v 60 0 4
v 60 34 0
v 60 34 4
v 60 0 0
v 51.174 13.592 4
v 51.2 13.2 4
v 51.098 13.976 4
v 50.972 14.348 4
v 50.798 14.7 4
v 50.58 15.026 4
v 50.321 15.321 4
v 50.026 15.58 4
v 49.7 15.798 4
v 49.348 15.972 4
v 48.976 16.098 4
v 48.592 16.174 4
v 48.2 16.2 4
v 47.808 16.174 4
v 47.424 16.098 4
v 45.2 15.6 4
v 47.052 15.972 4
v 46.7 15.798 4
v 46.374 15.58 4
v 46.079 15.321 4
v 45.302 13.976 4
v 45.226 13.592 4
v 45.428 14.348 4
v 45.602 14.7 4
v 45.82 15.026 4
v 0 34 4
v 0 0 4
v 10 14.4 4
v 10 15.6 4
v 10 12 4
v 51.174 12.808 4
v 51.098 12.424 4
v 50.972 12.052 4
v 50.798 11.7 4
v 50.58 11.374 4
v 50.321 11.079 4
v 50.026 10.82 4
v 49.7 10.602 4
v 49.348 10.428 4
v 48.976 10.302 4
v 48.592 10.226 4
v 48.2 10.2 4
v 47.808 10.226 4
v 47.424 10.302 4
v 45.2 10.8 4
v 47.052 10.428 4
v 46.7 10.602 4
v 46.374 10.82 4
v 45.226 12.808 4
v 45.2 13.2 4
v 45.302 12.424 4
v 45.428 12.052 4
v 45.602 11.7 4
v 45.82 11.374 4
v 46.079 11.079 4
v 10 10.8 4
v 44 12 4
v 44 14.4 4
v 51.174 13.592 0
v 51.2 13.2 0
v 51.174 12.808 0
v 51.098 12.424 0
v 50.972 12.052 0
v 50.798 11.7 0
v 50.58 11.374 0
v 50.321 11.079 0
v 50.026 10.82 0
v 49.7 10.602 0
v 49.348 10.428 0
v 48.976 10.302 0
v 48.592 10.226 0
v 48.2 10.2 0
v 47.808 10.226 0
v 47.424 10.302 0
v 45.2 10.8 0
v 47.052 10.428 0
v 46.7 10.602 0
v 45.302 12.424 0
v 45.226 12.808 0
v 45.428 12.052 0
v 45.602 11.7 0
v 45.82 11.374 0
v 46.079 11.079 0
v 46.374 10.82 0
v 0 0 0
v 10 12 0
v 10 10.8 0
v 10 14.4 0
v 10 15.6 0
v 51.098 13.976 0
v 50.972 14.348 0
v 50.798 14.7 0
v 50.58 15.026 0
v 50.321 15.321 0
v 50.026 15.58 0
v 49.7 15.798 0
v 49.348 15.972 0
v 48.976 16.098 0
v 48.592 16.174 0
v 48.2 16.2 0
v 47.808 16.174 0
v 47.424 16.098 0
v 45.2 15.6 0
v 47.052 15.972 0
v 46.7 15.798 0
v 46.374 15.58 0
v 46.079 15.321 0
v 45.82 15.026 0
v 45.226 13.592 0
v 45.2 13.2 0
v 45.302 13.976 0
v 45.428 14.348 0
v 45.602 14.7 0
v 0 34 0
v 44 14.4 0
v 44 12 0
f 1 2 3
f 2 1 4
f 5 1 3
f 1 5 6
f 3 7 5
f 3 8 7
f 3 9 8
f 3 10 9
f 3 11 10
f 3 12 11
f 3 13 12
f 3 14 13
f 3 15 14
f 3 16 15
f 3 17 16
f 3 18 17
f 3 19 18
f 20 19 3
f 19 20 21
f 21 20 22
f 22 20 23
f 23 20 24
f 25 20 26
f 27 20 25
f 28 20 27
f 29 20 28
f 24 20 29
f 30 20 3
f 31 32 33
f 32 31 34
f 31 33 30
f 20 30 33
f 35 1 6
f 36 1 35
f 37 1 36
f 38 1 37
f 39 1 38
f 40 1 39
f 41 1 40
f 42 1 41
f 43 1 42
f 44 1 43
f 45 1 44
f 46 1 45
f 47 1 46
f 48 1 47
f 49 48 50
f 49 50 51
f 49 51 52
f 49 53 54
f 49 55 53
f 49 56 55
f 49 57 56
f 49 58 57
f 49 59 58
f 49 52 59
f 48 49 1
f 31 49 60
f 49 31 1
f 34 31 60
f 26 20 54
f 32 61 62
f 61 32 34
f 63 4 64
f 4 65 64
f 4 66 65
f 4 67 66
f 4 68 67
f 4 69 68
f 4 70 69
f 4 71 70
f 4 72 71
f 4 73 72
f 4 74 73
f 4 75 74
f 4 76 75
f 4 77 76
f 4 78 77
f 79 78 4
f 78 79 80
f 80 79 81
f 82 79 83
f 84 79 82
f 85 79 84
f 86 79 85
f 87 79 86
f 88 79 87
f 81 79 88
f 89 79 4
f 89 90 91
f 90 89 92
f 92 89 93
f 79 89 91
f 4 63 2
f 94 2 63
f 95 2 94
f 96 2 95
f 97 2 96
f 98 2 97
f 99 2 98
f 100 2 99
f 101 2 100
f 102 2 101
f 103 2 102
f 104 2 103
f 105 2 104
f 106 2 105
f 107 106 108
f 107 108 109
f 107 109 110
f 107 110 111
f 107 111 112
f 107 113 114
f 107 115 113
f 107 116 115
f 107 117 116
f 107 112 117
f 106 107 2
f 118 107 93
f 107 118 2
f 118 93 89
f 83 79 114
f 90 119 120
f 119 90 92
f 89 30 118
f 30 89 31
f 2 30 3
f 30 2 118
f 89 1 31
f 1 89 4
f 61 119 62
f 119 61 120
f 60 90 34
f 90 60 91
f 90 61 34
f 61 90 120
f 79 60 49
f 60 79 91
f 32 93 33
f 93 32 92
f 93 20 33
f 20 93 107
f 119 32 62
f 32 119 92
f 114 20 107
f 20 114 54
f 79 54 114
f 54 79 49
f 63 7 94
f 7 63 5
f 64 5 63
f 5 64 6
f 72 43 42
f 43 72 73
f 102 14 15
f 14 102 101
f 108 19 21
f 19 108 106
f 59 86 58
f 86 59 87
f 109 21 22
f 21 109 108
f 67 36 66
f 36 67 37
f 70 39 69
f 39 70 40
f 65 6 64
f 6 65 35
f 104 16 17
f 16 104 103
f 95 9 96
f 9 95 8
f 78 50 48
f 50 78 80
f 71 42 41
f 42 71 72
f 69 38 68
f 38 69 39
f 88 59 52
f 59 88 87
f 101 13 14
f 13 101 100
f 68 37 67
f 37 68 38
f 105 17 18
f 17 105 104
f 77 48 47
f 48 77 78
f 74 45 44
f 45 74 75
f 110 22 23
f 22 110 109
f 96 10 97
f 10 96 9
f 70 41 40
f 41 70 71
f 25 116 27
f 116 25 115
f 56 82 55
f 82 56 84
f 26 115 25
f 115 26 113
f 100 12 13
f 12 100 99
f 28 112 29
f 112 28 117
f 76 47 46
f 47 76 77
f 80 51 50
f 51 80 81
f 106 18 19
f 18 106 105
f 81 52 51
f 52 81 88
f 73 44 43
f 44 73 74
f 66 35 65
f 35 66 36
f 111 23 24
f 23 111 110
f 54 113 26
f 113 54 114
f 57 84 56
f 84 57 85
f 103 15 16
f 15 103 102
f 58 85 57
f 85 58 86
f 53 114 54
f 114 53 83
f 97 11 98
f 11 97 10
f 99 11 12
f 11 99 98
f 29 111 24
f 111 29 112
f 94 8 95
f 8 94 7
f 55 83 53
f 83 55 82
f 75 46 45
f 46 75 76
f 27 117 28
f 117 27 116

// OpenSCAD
// A flat bracket with a springy arm cut out of it, that bends in the plane of the plate to let a
// 6 mm rod in. defect=true leaves a thin skin under the slots: the arm is joined to the plate along
// its whole length and cannot bend.
defect = false;
plate = [60, 34, 4];
arm_w = 2.4;
arm_l = 34;
slot = 1.2;
rod = 6;
skin = defect ? 0.6 : -1;

echo(cadverify_spec = [
    ["bounds", [[0, 0, 0], plate]],
    ["bodies", 1],
    ["through_holes", defect ? 0 : 2],
    ["material", "PLA"]
]);

x0 = 10;
y0 = 12;
difference() {
    cube(plate);
    // the U-shaped slot around the arm, and the seat of the rod at its free end
    translate([x0, y0 - slot, skin]) cube([arm_l, slot, plate[2] + 2]);
    translate([x0, y0 + arm_w, skin]) cube([arm_l, slot, plate[2] + 2]);
    translate([x0 + arm_l, y0 - slot, skin]) cube([slot, arm_w + 2 * slot, plate[2] + 2]);
    translate([x0 + arm_l + rod / 2 + slot, y0 + arm_w / 2, skin])
        cylinder(d = rod, h = plate[2] + 2, $fn = 48);
}
